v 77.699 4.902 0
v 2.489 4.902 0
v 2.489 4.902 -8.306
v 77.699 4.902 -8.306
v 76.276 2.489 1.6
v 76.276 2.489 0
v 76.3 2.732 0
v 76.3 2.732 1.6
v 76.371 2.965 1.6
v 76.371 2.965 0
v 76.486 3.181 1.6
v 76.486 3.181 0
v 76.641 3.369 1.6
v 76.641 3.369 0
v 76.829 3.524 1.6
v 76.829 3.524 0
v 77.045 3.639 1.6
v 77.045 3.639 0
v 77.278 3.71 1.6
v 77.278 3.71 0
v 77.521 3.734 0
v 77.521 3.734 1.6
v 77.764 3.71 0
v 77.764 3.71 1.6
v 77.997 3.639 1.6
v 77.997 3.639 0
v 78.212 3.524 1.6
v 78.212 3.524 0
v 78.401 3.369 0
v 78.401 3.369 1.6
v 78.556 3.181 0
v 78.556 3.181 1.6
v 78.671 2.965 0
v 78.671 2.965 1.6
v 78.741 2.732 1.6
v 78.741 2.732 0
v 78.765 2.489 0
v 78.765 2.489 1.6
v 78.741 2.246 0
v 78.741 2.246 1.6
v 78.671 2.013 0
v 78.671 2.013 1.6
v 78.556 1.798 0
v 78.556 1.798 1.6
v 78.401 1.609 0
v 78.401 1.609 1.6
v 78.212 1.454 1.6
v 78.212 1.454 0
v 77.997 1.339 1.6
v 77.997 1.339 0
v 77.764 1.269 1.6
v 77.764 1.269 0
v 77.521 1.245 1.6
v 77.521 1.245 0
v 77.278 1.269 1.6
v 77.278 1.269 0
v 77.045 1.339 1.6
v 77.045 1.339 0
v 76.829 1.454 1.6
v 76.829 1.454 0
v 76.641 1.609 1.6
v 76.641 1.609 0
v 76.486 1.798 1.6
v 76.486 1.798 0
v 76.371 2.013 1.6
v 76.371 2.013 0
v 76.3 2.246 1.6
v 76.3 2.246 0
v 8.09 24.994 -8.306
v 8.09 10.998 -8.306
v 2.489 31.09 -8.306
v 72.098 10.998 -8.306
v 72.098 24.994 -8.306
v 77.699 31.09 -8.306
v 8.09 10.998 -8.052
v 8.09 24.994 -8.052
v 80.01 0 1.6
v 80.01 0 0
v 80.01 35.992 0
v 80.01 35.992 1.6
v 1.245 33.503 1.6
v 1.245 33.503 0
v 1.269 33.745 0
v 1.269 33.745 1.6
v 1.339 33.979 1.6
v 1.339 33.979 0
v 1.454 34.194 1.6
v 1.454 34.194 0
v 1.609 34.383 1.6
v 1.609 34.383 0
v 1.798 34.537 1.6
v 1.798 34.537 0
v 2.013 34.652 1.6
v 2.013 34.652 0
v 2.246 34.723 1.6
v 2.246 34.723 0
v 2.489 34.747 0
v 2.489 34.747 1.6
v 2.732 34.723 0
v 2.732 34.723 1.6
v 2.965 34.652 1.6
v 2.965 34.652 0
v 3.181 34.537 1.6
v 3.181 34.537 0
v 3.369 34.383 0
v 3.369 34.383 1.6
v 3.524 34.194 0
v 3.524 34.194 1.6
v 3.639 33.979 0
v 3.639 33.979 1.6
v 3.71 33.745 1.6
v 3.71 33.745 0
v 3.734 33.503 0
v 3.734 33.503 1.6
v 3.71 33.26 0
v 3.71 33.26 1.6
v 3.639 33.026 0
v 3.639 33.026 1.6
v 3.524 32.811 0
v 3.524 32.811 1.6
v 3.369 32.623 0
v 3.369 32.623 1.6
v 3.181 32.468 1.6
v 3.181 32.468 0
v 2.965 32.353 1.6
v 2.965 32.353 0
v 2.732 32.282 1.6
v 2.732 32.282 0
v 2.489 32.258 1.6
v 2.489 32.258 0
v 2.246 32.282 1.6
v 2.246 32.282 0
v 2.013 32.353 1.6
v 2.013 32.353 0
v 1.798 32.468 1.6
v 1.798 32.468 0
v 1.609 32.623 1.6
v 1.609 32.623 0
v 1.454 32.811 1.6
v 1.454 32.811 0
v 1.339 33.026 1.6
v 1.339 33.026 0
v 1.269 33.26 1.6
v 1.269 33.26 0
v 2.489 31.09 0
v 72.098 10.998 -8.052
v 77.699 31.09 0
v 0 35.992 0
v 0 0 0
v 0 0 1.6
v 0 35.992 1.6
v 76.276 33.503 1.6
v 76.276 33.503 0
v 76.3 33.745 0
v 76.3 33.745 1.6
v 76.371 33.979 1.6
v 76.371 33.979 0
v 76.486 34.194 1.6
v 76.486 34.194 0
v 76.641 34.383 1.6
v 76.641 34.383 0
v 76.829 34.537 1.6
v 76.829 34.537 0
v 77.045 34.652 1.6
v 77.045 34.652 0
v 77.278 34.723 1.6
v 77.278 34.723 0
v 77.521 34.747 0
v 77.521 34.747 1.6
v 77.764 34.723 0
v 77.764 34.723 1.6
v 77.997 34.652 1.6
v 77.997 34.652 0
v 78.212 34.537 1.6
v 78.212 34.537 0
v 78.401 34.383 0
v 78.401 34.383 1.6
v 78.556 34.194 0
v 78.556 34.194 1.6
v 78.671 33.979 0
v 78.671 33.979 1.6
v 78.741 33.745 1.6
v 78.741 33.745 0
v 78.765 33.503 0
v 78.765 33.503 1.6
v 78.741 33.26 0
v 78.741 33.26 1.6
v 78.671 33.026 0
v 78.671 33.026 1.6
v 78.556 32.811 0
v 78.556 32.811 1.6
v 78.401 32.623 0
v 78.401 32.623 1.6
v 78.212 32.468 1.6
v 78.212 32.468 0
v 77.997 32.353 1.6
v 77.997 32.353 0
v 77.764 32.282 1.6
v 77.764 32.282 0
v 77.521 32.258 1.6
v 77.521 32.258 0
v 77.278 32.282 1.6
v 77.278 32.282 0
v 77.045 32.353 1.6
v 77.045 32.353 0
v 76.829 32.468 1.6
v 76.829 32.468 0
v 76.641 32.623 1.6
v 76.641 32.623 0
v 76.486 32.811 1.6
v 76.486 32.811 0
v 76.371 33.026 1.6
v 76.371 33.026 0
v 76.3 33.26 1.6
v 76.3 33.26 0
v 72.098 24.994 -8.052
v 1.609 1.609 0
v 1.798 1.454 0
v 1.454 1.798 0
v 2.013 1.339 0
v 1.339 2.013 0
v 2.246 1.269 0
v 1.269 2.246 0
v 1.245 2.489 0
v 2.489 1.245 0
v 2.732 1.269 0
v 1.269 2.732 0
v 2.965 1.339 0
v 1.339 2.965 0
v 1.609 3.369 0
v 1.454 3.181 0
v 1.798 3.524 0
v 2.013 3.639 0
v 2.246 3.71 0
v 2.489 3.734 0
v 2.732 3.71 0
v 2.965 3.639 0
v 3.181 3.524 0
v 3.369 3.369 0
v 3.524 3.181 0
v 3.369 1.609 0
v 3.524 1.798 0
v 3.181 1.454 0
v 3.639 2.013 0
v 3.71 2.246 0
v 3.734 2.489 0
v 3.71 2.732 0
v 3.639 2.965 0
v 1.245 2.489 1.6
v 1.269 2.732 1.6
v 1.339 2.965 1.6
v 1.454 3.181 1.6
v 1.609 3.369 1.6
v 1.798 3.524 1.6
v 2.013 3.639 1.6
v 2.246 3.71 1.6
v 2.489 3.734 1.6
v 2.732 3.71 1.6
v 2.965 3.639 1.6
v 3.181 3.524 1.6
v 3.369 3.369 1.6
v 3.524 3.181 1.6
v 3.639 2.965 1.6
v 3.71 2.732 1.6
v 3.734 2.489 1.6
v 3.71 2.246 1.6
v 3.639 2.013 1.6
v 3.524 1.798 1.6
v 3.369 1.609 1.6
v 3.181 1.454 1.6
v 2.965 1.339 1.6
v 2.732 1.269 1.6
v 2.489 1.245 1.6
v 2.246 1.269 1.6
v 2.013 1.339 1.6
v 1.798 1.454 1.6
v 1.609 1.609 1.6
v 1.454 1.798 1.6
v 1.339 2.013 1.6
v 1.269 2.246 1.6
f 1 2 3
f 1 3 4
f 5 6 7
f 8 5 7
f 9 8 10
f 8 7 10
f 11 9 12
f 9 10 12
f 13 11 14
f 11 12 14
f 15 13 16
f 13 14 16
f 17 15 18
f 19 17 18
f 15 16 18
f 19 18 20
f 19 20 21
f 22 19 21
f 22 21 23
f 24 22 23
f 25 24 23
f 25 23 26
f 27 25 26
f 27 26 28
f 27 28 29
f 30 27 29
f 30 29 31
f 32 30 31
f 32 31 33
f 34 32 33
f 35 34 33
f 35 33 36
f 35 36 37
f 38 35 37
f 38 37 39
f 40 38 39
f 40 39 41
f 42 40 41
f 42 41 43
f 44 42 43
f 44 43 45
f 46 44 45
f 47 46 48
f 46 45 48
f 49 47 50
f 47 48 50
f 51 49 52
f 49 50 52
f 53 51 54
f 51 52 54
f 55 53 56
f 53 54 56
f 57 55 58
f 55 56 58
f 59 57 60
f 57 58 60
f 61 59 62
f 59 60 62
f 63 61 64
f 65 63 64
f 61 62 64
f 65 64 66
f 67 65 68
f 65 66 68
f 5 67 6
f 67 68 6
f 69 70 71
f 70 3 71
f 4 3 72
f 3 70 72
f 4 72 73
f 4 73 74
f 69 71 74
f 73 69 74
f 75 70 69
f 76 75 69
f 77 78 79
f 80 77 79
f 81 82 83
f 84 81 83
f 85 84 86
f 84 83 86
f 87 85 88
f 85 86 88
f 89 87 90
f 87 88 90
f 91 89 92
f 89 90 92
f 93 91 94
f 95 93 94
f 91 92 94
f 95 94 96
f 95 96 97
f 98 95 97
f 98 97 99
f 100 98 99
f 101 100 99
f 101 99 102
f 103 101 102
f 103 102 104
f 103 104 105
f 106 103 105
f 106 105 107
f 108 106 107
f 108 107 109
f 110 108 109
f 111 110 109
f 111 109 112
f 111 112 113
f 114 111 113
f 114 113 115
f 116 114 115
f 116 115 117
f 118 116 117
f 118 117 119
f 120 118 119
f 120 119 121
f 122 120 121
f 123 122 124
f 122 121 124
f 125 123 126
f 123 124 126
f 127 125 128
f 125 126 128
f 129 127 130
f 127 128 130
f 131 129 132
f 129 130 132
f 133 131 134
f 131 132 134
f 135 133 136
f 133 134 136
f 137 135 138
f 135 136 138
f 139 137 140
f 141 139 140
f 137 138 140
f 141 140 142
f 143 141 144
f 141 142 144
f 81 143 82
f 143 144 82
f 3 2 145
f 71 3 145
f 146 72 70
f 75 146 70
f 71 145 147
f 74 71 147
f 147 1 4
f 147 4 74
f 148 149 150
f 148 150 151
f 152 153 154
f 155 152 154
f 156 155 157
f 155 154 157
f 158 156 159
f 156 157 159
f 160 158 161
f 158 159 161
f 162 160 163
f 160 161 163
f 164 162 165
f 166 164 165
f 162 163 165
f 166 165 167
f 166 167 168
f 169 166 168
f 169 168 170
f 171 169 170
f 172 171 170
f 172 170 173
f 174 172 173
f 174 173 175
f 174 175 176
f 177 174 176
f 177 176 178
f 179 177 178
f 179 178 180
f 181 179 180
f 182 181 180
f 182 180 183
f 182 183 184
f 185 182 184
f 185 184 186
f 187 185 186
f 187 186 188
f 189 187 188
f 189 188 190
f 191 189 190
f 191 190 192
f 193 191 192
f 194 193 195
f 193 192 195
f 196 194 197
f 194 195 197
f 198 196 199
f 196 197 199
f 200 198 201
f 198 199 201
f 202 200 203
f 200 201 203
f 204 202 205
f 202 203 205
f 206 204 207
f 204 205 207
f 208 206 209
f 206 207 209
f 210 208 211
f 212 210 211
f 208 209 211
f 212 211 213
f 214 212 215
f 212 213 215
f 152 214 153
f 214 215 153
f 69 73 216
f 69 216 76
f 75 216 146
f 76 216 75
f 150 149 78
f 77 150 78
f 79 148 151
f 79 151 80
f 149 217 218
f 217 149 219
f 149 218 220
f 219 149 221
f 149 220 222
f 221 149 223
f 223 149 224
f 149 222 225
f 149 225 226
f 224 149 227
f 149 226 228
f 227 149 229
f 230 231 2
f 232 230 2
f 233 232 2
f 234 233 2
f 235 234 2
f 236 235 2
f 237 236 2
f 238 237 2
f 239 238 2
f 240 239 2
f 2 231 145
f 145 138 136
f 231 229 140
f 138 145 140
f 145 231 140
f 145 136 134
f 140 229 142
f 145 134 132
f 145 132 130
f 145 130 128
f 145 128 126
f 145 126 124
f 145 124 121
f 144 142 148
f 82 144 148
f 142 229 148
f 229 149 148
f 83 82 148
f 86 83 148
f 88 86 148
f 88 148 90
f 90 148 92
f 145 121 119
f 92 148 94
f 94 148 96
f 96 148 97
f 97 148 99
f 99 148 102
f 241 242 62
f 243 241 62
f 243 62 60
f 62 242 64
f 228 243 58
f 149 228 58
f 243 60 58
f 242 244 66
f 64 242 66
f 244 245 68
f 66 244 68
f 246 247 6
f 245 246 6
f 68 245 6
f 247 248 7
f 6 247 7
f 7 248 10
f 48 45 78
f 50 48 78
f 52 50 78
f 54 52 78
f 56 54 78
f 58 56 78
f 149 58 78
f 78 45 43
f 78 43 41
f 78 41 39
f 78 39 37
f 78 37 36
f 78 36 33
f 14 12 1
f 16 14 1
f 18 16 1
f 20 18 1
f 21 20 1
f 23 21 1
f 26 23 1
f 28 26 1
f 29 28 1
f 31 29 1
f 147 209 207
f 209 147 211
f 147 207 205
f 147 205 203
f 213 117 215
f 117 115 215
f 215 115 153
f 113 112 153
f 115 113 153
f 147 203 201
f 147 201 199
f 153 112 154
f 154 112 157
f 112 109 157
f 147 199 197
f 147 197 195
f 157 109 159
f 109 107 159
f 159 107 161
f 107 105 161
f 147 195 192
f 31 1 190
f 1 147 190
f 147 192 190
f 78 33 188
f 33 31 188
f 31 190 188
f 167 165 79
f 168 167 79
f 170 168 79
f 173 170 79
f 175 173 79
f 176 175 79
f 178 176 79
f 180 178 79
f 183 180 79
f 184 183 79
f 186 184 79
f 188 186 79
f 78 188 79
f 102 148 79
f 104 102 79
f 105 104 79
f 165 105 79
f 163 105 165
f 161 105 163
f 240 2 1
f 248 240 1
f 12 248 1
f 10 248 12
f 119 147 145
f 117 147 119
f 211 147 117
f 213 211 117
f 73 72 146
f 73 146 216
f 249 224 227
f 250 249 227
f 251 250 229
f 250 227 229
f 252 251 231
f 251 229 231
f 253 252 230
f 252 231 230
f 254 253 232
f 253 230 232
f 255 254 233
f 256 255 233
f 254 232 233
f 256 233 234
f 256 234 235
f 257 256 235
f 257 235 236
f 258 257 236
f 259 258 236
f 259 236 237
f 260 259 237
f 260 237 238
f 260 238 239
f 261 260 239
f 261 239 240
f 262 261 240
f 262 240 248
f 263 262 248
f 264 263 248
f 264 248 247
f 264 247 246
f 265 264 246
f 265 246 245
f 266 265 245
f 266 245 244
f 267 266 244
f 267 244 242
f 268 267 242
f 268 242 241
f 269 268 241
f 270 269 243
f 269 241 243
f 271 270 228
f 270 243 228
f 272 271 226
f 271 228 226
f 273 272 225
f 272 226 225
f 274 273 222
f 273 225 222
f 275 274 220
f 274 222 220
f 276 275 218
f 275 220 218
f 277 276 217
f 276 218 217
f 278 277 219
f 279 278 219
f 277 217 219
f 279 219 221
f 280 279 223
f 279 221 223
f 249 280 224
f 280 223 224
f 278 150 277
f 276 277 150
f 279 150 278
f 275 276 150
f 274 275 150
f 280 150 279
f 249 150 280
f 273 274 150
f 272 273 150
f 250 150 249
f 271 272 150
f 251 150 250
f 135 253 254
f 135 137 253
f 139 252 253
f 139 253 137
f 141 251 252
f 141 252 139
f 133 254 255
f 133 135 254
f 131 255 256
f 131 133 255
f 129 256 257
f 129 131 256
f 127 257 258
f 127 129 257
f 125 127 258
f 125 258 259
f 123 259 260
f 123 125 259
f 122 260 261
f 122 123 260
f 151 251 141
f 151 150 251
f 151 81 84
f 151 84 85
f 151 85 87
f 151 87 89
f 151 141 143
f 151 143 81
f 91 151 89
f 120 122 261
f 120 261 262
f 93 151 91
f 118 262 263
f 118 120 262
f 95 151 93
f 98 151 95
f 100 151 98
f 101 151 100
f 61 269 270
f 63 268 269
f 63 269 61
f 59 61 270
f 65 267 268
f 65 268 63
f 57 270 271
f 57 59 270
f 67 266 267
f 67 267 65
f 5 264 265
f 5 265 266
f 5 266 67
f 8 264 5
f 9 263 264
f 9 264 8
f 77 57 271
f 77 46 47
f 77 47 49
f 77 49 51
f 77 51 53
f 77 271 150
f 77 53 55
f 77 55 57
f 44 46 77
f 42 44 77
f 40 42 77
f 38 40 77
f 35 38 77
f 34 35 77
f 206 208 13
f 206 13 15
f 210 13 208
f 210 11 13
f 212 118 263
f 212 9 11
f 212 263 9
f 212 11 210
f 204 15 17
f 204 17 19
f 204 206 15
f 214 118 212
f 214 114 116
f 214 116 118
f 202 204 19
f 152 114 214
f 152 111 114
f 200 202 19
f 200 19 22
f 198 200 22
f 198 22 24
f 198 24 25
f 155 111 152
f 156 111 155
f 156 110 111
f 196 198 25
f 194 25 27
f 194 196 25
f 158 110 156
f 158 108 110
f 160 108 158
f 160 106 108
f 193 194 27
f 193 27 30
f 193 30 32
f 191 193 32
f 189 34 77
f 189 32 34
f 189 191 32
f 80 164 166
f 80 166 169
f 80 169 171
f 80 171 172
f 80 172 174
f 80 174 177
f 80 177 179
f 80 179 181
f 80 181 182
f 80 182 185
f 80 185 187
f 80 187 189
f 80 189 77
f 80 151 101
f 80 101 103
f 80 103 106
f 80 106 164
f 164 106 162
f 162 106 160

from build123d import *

# Parameters (mm, degrees)
SKETCH1_W           = 80.01
SKETCH1_H           = 35.9918
BOSS_EXTRUDE1_DEPTH = 1.6002
SKETCH1_3_W         = 75.2094
SKETCH1_3_H         = 26.1874
BOSS_EXTRUDE2_DEPTH = 8.3058
SKETCH2_W           = 64.008
SKETCH2_H           = 13.9954
CUT_EXTRUDE1_DEPTH  = 0.254
SKETCH3_R           = 1.2446
CUT_EXTRUDE2_DEPTH  = 2.54


with BuildPart() as part:
    # Sketch1 → Boss-Extrude1 (new body)
    with BuildSketch(Plane.XY):
        with Locations((40.005, 17.9959)):
            Rectangle(SKETCH1_W, SKETCH1_H)
    extrude(amount=BOSS_EXTRUDE1_DEPTH)

    # Sketch1<3> → Boss-Extrude2 (add)
    with BuildSketch(Plane.XY):
        with Locations((40.0939, 17.9959)):
            Rectangle(SKETCH1_3_W, SKETCH1_3_H)
    extrude(amount=-BOSS_EXTRUDE2_DEPTH)

    # Sketch2 → Cut-Extrude1 (cut)
    with BuildSketch(Plane(origin=(0, 0, -8.3058), x_dir=(-1, 0, 0), z_dir=(0, 0, -1))):
        with Locations((-40.0939, 17.9959)):
            Rectangle(SKETCH2_W, SKETCH2_H)
    extrude(amount=-CUT_EXTRUDE1_DEPTH, mode=Mode.SUBTRACT)

    # Sketch3 → Cut-Extrude2 (cut)
    with BuildSketch(Plane(origin=(0, 0, 0), x_dir=(-1, 0, 0), z_dir=(0, 0, -1))):
        with Locations((-77.5208, 2.4892)):
            Circle(SKETCH3_R)
        with Locations((-77.5208, 33.5026)):
            Circle(SKETCH3_R)
        with Locations((-2.4892, 33.5026)):
            Circle(SKETCH3_R)
        with Locations((-2.4892, 2.4892)):
            Circle(SKETCH3_R)
    extrude(amount=-CUT_EXTRUDE2_DEPTH, mode=Mode.SUBTRACT)


solid = part.part
